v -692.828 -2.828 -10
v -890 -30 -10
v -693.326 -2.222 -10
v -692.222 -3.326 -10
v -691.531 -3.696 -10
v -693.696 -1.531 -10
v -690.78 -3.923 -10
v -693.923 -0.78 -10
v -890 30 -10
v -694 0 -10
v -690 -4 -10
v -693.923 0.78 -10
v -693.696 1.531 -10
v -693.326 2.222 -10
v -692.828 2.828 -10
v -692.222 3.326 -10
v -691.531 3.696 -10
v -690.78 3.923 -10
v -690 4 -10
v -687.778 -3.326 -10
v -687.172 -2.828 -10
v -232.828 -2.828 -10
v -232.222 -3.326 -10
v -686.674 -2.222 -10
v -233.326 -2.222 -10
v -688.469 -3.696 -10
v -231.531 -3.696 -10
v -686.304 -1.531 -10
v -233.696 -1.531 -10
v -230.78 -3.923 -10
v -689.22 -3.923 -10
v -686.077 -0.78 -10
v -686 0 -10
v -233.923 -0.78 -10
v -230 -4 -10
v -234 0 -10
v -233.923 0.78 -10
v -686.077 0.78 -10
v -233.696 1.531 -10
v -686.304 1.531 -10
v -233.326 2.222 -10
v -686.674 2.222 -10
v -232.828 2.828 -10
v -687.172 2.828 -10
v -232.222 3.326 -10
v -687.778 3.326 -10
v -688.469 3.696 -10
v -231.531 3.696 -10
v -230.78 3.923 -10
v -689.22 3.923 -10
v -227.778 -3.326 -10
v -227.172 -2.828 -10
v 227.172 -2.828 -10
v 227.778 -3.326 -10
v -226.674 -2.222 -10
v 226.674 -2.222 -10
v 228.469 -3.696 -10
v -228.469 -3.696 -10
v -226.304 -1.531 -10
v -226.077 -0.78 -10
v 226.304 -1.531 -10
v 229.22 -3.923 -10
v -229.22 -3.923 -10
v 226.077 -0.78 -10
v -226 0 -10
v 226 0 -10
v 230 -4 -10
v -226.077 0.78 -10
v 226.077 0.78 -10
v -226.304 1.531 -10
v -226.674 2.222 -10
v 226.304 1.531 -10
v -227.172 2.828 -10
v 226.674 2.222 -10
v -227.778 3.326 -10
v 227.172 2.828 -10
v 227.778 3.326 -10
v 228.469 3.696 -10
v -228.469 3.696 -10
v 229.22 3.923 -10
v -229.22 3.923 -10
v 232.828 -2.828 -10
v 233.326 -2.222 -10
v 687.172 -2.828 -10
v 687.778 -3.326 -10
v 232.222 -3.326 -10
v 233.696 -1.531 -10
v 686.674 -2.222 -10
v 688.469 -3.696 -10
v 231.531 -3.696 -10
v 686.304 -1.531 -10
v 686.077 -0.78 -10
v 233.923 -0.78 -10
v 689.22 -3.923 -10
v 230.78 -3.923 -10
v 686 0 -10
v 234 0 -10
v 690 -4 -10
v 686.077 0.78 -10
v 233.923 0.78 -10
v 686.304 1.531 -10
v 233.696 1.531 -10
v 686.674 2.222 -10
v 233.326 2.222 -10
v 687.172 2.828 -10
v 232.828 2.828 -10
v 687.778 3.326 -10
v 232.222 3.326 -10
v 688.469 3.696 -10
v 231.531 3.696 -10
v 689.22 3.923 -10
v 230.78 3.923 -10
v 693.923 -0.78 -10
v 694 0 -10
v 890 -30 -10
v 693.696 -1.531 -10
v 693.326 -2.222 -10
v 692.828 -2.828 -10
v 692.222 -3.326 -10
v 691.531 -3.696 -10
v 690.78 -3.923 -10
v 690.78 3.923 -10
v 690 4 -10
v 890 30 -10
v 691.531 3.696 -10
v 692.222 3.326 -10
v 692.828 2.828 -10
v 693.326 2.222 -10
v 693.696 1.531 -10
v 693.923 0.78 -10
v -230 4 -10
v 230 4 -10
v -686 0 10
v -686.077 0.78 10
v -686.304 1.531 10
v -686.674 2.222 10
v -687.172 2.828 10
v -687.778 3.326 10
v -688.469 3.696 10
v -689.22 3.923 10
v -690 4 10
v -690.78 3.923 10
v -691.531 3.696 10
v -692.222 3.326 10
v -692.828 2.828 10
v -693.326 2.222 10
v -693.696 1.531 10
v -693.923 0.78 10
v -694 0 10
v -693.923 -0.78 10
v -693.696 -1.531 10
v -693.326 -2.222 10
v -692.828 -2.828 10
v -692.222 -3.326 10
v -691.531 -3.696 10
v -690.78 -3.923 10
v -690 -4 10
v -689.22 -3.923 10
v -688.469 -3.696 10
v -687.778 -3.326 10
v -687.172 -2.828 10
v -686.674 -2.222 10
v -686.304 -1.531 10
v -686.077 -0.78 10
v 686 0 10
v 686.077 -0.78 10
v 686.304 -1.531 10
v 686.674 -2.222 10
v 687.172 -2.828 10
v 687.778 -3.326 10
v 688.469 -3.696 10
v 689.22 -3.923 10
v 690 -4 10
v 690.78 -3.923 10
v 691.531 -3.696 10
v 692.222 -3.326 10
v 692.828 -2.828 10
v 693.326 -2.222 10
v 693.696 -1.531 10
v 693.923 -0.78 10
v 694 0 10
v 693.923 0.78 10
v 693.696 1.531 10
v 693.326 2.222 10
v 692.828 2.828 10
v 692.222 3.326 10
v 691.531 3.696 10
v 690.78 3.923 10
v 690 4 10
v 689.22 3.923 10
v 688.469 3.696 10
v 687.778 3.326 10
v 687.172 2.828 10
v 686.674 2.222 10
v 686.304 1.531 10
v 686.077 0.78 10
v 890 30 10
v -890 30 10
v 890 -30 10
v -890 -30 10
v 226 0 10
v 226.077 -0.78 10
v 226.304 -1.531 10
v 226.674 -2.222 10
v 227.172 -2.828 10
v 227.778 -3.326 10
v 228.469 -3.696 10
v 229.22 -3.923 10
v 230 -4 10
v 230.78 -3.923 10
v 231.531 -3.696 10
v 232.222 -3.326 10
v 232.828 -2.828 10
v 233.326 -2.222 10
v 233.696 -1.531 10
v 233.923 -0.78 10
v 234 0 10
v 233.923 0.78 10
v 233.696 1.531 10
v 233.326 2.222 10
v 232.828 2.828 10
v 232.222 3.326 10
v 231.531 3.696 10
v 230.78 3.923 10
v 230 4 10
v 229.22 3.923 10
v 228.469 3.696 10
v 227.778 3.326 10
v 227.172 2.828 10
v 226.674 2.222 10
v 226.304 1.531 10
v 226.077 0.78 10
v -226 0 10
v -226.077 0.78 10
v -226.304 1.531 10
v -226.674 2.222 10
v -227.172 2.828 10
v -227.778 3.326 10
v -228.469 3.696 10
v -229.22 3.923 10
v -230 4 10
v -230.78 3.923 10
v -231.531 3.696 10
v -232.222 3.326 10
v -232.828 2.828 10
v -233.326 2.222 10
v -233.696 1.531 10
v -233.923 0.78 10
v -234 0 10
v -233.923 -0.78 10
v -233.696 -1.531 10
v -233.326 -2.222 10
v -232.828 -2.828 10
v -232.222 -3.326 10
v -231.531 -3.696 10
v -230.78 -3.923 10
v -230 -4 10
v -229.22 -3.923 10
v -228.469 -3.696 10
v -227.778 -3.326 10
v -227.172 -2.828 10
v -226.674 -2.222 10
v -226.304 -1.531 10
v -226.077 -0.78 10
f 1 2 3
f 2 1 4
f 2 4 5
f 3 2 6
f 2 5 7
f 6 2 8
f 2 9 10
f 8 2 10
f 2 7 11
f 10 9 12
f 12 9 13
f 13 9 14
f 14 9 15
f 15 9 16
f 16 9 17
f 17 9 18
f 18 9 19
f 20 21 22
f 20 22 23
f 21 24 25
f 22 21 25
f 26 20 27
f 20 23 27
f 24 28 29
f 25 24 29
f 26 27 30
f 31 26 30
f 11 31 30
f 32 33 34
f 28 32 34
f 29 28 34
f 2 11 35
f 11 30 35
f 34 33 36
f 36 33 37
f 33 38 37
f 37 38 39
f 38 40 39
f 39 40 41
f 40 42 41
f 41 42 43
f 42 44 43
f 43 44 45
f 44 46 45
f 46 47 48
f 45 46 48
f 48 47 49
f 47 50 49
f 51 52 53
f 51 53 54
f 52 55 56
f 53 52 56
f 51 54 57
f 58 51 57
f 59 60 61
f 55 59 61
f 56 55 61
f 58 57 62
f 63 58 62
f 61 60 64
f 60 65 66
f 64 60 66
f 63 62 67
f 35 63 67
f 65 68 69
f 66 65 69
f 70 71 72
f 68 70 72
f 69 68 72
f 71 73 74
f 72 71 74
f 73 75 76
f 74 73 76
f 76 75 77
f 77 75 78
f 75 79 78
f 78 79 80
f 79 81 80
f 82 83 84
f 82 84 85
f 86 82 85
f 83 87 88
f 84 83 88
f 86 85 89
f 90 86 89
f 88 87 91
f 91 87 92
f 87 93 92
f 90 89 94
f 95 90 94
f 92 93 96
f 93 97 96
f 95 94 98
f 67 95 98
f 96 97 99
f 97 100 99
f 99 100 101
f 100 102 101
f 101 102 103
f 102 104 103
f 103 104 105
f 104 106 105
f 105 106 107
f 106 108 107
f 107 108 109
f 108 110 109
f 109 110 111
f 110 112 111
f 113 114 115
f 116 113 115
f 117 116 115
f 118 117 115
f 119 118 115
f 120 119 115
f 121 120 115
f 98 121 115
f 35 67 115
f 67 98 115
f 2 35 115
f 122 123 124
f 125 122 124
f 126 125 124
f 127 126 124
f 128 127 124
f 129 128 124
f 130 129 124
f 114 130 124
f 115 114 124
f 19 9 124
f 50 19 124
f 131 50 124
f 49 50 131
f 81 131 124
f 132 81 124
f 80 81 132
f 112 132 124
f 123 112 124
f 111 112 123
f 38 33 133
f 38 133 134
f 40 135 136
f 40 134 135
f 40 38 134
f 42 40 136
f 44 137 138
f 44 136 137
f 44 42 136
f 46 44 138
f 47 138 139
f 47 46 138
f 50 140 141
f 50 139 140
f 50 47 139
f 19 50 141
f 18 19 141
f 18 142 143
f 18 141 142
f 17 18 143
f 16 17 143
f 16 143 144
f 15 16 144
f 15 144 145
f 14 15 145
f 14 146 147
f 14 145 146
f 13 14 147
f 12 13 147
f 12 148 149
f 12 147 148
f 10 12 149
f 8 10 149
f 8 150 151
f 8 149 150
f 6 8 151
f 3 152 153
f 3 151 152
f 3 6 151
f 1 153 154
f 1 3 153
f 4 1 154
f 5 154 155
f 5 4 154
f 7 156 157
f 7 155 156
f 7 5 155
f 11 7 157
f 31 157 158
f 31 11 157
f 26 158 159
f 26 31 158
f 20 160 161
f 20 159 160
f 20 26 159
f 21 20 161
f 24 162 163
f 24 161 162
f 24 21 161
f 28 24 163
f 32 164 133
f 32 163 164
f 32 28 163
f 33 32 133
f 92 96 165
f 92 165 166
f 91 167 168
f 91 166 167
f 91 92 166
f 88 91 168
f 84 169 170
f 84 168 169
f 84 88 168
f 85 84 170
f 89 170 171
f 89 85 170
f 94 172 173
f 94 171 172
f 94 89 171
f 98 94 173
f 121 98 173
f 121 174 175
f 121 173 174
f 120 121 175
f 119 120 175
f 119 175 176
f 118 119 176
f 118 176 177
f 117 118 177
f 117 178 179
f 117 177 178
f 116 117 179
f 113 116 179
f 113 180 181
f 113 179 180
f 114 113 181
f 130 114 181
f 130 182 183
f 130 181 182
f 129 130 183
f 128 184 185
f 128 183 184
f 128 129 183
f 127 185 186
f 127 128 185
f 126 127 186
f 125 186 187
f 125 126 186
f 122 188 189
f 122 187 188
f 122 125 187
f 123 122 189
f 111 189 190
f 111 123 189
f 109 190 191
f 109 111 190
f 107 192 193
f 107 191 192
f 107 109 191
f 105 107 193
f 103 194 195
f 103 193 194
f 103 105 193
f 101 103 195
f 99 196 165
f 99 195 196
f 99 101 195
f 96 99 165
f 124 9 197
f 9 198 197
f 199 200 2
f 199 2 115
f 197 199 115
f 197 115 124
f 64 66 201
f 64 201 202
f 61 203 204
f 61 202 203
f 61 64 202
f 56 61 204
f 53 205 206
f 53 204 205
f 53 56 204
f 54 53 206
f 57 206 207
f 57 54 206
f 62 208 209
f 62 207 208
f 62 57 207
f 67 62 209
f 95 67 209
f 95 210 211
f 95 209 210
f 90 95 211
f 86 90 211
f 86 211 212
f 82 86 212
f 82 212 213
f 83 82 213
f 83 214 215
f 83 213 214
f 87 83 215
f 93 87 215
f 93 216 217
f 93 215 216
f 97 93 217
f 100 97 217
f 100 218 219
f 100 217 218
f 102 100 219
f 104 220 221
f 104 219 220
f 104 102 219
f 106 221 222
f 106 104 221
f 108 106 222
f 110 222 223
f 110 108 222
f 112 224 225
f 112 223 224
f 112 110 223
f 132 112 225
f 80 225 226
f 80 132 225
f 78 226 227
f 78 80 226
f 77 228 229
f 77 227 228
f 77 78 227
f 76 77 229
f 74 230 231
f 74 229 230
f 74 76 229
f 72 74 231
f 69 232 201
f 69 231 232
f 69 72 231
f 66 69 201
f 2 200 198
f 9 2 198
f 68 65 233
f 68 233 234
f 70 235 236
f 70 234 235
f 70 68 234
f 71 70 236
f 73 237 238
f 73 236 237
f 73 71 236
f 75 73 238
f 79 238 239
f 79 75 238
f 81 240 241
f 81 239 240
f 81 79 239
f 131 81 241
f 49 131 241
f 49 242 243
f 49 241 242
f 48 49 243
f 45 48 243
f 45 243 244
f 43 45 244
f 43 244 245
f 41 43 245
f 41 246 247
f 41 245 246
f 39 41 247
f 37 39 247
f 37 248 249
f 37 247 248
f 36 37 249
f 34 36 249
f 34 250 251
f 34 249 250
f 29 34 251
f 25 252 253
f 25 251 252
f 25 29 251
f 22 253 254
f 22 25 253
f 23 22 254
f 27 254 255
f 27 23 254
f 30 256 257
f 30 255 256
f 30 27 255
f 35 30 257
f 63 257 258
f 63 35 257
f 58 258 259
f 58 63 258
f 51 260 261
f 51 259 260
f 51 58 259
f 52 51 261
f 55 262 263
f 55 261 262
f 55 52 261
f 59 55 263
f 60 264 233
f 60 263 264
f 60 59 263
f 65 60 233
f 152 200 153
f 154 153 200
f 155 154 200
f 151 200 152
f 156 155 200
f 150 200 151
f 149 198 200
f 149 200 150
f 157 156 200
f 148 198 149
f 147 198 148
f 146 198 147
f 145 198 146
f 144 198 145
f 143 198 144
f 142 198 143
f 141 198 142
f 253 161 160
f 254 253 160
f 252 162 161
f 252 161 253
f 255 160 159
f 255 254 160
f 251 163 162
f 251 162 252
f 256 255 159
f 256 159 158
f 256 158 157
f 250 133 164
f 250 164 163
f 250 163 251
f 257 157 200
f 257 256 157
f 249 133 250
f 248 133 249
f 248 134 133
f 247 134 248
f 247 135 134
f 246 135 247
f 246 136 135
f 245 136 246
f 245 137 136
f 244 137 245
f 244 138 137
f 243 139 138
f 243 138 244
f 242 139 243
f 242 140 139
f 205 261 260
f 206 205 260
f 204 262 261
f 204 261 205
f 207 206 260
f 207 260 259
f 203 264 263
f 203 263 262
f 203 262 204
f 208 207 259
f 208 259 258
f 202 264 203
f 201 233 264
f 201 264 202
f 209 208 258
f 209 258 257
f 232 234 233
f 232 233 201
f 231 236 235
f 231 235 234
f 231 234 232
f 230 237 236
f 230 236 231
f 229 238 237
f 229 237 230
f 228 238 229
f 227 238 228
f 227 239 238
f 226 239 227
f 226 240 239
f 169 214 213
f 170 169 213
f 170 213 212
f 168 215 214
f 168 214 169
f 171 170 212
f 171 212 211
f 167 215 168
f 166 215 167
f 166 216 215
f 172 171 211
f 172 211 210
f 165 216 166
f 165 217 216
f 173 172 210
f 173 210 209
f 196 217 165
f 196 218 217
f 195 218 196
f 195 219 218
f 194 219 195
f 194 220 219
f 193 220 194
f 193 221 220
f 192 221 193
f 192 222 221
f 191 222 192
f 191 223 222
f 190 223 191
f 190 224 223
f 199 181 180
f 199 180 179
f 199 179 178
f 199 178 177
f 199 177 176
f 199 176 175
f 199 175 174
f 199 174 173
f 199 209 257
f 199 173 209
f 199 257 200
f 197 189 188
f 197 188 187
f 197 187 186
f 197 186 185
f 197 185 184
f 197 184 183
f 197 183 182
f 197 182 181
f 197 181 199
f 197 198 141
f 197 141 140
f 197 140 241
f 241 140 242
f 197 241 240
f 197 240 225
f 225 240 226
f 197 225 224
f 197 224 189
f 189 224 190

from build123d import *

# Parameters (mm, degrees)
SKETCH_1_W               = 1780
SKETCH_1_H               = 60
EXTRUDE_1_DEPTH          = 10
CUT_EXTRUDE_1_DEPTH      = 891.561620552
CUT_EXTRUDE_1_DEPTH_BACK = 891.561620552
SKETCH_2_R               = 4


with BuildPart() as part:
    # Эскиз1 → Бобышка-Вытянуть1 (new, symmetric)
    with BuildSketch(Plane.XY):
        Rectangle(SKETCH_1_W, SKETCH_1_H)
    extrude(amount=EXTRUDE_1_DEPTH, both=True)

    # Эскиз2 → Вырез-Вытянуть1 (cut, two sides: drawn at the far end of the back side and taken through both)
    with BuildSketch(Plane.XY.offset(-CUT_EXTRUDE_1_DEPTH_BACK)):
        with Locations((-690, 0)):
            Circle(SKETCH_2_R)
        with Locations((-230, 0)):
            Circle(SKETCH_2_R)
        with Locations(Location((230, 0, 0), (0, 0, 180))):
            Circle(SKETCH_2_R)
        with Locations(Location((690, 0, 0), (0, 0, 180))):
            Circle(SKETCH_2_R)
    extrude(amount=CUT_EXTRUDE_1_DEPTH + CUT_EXTRUDE_1_DEPTH_BACK, mode=Mode.SUBTRACT)


solid = part.part
